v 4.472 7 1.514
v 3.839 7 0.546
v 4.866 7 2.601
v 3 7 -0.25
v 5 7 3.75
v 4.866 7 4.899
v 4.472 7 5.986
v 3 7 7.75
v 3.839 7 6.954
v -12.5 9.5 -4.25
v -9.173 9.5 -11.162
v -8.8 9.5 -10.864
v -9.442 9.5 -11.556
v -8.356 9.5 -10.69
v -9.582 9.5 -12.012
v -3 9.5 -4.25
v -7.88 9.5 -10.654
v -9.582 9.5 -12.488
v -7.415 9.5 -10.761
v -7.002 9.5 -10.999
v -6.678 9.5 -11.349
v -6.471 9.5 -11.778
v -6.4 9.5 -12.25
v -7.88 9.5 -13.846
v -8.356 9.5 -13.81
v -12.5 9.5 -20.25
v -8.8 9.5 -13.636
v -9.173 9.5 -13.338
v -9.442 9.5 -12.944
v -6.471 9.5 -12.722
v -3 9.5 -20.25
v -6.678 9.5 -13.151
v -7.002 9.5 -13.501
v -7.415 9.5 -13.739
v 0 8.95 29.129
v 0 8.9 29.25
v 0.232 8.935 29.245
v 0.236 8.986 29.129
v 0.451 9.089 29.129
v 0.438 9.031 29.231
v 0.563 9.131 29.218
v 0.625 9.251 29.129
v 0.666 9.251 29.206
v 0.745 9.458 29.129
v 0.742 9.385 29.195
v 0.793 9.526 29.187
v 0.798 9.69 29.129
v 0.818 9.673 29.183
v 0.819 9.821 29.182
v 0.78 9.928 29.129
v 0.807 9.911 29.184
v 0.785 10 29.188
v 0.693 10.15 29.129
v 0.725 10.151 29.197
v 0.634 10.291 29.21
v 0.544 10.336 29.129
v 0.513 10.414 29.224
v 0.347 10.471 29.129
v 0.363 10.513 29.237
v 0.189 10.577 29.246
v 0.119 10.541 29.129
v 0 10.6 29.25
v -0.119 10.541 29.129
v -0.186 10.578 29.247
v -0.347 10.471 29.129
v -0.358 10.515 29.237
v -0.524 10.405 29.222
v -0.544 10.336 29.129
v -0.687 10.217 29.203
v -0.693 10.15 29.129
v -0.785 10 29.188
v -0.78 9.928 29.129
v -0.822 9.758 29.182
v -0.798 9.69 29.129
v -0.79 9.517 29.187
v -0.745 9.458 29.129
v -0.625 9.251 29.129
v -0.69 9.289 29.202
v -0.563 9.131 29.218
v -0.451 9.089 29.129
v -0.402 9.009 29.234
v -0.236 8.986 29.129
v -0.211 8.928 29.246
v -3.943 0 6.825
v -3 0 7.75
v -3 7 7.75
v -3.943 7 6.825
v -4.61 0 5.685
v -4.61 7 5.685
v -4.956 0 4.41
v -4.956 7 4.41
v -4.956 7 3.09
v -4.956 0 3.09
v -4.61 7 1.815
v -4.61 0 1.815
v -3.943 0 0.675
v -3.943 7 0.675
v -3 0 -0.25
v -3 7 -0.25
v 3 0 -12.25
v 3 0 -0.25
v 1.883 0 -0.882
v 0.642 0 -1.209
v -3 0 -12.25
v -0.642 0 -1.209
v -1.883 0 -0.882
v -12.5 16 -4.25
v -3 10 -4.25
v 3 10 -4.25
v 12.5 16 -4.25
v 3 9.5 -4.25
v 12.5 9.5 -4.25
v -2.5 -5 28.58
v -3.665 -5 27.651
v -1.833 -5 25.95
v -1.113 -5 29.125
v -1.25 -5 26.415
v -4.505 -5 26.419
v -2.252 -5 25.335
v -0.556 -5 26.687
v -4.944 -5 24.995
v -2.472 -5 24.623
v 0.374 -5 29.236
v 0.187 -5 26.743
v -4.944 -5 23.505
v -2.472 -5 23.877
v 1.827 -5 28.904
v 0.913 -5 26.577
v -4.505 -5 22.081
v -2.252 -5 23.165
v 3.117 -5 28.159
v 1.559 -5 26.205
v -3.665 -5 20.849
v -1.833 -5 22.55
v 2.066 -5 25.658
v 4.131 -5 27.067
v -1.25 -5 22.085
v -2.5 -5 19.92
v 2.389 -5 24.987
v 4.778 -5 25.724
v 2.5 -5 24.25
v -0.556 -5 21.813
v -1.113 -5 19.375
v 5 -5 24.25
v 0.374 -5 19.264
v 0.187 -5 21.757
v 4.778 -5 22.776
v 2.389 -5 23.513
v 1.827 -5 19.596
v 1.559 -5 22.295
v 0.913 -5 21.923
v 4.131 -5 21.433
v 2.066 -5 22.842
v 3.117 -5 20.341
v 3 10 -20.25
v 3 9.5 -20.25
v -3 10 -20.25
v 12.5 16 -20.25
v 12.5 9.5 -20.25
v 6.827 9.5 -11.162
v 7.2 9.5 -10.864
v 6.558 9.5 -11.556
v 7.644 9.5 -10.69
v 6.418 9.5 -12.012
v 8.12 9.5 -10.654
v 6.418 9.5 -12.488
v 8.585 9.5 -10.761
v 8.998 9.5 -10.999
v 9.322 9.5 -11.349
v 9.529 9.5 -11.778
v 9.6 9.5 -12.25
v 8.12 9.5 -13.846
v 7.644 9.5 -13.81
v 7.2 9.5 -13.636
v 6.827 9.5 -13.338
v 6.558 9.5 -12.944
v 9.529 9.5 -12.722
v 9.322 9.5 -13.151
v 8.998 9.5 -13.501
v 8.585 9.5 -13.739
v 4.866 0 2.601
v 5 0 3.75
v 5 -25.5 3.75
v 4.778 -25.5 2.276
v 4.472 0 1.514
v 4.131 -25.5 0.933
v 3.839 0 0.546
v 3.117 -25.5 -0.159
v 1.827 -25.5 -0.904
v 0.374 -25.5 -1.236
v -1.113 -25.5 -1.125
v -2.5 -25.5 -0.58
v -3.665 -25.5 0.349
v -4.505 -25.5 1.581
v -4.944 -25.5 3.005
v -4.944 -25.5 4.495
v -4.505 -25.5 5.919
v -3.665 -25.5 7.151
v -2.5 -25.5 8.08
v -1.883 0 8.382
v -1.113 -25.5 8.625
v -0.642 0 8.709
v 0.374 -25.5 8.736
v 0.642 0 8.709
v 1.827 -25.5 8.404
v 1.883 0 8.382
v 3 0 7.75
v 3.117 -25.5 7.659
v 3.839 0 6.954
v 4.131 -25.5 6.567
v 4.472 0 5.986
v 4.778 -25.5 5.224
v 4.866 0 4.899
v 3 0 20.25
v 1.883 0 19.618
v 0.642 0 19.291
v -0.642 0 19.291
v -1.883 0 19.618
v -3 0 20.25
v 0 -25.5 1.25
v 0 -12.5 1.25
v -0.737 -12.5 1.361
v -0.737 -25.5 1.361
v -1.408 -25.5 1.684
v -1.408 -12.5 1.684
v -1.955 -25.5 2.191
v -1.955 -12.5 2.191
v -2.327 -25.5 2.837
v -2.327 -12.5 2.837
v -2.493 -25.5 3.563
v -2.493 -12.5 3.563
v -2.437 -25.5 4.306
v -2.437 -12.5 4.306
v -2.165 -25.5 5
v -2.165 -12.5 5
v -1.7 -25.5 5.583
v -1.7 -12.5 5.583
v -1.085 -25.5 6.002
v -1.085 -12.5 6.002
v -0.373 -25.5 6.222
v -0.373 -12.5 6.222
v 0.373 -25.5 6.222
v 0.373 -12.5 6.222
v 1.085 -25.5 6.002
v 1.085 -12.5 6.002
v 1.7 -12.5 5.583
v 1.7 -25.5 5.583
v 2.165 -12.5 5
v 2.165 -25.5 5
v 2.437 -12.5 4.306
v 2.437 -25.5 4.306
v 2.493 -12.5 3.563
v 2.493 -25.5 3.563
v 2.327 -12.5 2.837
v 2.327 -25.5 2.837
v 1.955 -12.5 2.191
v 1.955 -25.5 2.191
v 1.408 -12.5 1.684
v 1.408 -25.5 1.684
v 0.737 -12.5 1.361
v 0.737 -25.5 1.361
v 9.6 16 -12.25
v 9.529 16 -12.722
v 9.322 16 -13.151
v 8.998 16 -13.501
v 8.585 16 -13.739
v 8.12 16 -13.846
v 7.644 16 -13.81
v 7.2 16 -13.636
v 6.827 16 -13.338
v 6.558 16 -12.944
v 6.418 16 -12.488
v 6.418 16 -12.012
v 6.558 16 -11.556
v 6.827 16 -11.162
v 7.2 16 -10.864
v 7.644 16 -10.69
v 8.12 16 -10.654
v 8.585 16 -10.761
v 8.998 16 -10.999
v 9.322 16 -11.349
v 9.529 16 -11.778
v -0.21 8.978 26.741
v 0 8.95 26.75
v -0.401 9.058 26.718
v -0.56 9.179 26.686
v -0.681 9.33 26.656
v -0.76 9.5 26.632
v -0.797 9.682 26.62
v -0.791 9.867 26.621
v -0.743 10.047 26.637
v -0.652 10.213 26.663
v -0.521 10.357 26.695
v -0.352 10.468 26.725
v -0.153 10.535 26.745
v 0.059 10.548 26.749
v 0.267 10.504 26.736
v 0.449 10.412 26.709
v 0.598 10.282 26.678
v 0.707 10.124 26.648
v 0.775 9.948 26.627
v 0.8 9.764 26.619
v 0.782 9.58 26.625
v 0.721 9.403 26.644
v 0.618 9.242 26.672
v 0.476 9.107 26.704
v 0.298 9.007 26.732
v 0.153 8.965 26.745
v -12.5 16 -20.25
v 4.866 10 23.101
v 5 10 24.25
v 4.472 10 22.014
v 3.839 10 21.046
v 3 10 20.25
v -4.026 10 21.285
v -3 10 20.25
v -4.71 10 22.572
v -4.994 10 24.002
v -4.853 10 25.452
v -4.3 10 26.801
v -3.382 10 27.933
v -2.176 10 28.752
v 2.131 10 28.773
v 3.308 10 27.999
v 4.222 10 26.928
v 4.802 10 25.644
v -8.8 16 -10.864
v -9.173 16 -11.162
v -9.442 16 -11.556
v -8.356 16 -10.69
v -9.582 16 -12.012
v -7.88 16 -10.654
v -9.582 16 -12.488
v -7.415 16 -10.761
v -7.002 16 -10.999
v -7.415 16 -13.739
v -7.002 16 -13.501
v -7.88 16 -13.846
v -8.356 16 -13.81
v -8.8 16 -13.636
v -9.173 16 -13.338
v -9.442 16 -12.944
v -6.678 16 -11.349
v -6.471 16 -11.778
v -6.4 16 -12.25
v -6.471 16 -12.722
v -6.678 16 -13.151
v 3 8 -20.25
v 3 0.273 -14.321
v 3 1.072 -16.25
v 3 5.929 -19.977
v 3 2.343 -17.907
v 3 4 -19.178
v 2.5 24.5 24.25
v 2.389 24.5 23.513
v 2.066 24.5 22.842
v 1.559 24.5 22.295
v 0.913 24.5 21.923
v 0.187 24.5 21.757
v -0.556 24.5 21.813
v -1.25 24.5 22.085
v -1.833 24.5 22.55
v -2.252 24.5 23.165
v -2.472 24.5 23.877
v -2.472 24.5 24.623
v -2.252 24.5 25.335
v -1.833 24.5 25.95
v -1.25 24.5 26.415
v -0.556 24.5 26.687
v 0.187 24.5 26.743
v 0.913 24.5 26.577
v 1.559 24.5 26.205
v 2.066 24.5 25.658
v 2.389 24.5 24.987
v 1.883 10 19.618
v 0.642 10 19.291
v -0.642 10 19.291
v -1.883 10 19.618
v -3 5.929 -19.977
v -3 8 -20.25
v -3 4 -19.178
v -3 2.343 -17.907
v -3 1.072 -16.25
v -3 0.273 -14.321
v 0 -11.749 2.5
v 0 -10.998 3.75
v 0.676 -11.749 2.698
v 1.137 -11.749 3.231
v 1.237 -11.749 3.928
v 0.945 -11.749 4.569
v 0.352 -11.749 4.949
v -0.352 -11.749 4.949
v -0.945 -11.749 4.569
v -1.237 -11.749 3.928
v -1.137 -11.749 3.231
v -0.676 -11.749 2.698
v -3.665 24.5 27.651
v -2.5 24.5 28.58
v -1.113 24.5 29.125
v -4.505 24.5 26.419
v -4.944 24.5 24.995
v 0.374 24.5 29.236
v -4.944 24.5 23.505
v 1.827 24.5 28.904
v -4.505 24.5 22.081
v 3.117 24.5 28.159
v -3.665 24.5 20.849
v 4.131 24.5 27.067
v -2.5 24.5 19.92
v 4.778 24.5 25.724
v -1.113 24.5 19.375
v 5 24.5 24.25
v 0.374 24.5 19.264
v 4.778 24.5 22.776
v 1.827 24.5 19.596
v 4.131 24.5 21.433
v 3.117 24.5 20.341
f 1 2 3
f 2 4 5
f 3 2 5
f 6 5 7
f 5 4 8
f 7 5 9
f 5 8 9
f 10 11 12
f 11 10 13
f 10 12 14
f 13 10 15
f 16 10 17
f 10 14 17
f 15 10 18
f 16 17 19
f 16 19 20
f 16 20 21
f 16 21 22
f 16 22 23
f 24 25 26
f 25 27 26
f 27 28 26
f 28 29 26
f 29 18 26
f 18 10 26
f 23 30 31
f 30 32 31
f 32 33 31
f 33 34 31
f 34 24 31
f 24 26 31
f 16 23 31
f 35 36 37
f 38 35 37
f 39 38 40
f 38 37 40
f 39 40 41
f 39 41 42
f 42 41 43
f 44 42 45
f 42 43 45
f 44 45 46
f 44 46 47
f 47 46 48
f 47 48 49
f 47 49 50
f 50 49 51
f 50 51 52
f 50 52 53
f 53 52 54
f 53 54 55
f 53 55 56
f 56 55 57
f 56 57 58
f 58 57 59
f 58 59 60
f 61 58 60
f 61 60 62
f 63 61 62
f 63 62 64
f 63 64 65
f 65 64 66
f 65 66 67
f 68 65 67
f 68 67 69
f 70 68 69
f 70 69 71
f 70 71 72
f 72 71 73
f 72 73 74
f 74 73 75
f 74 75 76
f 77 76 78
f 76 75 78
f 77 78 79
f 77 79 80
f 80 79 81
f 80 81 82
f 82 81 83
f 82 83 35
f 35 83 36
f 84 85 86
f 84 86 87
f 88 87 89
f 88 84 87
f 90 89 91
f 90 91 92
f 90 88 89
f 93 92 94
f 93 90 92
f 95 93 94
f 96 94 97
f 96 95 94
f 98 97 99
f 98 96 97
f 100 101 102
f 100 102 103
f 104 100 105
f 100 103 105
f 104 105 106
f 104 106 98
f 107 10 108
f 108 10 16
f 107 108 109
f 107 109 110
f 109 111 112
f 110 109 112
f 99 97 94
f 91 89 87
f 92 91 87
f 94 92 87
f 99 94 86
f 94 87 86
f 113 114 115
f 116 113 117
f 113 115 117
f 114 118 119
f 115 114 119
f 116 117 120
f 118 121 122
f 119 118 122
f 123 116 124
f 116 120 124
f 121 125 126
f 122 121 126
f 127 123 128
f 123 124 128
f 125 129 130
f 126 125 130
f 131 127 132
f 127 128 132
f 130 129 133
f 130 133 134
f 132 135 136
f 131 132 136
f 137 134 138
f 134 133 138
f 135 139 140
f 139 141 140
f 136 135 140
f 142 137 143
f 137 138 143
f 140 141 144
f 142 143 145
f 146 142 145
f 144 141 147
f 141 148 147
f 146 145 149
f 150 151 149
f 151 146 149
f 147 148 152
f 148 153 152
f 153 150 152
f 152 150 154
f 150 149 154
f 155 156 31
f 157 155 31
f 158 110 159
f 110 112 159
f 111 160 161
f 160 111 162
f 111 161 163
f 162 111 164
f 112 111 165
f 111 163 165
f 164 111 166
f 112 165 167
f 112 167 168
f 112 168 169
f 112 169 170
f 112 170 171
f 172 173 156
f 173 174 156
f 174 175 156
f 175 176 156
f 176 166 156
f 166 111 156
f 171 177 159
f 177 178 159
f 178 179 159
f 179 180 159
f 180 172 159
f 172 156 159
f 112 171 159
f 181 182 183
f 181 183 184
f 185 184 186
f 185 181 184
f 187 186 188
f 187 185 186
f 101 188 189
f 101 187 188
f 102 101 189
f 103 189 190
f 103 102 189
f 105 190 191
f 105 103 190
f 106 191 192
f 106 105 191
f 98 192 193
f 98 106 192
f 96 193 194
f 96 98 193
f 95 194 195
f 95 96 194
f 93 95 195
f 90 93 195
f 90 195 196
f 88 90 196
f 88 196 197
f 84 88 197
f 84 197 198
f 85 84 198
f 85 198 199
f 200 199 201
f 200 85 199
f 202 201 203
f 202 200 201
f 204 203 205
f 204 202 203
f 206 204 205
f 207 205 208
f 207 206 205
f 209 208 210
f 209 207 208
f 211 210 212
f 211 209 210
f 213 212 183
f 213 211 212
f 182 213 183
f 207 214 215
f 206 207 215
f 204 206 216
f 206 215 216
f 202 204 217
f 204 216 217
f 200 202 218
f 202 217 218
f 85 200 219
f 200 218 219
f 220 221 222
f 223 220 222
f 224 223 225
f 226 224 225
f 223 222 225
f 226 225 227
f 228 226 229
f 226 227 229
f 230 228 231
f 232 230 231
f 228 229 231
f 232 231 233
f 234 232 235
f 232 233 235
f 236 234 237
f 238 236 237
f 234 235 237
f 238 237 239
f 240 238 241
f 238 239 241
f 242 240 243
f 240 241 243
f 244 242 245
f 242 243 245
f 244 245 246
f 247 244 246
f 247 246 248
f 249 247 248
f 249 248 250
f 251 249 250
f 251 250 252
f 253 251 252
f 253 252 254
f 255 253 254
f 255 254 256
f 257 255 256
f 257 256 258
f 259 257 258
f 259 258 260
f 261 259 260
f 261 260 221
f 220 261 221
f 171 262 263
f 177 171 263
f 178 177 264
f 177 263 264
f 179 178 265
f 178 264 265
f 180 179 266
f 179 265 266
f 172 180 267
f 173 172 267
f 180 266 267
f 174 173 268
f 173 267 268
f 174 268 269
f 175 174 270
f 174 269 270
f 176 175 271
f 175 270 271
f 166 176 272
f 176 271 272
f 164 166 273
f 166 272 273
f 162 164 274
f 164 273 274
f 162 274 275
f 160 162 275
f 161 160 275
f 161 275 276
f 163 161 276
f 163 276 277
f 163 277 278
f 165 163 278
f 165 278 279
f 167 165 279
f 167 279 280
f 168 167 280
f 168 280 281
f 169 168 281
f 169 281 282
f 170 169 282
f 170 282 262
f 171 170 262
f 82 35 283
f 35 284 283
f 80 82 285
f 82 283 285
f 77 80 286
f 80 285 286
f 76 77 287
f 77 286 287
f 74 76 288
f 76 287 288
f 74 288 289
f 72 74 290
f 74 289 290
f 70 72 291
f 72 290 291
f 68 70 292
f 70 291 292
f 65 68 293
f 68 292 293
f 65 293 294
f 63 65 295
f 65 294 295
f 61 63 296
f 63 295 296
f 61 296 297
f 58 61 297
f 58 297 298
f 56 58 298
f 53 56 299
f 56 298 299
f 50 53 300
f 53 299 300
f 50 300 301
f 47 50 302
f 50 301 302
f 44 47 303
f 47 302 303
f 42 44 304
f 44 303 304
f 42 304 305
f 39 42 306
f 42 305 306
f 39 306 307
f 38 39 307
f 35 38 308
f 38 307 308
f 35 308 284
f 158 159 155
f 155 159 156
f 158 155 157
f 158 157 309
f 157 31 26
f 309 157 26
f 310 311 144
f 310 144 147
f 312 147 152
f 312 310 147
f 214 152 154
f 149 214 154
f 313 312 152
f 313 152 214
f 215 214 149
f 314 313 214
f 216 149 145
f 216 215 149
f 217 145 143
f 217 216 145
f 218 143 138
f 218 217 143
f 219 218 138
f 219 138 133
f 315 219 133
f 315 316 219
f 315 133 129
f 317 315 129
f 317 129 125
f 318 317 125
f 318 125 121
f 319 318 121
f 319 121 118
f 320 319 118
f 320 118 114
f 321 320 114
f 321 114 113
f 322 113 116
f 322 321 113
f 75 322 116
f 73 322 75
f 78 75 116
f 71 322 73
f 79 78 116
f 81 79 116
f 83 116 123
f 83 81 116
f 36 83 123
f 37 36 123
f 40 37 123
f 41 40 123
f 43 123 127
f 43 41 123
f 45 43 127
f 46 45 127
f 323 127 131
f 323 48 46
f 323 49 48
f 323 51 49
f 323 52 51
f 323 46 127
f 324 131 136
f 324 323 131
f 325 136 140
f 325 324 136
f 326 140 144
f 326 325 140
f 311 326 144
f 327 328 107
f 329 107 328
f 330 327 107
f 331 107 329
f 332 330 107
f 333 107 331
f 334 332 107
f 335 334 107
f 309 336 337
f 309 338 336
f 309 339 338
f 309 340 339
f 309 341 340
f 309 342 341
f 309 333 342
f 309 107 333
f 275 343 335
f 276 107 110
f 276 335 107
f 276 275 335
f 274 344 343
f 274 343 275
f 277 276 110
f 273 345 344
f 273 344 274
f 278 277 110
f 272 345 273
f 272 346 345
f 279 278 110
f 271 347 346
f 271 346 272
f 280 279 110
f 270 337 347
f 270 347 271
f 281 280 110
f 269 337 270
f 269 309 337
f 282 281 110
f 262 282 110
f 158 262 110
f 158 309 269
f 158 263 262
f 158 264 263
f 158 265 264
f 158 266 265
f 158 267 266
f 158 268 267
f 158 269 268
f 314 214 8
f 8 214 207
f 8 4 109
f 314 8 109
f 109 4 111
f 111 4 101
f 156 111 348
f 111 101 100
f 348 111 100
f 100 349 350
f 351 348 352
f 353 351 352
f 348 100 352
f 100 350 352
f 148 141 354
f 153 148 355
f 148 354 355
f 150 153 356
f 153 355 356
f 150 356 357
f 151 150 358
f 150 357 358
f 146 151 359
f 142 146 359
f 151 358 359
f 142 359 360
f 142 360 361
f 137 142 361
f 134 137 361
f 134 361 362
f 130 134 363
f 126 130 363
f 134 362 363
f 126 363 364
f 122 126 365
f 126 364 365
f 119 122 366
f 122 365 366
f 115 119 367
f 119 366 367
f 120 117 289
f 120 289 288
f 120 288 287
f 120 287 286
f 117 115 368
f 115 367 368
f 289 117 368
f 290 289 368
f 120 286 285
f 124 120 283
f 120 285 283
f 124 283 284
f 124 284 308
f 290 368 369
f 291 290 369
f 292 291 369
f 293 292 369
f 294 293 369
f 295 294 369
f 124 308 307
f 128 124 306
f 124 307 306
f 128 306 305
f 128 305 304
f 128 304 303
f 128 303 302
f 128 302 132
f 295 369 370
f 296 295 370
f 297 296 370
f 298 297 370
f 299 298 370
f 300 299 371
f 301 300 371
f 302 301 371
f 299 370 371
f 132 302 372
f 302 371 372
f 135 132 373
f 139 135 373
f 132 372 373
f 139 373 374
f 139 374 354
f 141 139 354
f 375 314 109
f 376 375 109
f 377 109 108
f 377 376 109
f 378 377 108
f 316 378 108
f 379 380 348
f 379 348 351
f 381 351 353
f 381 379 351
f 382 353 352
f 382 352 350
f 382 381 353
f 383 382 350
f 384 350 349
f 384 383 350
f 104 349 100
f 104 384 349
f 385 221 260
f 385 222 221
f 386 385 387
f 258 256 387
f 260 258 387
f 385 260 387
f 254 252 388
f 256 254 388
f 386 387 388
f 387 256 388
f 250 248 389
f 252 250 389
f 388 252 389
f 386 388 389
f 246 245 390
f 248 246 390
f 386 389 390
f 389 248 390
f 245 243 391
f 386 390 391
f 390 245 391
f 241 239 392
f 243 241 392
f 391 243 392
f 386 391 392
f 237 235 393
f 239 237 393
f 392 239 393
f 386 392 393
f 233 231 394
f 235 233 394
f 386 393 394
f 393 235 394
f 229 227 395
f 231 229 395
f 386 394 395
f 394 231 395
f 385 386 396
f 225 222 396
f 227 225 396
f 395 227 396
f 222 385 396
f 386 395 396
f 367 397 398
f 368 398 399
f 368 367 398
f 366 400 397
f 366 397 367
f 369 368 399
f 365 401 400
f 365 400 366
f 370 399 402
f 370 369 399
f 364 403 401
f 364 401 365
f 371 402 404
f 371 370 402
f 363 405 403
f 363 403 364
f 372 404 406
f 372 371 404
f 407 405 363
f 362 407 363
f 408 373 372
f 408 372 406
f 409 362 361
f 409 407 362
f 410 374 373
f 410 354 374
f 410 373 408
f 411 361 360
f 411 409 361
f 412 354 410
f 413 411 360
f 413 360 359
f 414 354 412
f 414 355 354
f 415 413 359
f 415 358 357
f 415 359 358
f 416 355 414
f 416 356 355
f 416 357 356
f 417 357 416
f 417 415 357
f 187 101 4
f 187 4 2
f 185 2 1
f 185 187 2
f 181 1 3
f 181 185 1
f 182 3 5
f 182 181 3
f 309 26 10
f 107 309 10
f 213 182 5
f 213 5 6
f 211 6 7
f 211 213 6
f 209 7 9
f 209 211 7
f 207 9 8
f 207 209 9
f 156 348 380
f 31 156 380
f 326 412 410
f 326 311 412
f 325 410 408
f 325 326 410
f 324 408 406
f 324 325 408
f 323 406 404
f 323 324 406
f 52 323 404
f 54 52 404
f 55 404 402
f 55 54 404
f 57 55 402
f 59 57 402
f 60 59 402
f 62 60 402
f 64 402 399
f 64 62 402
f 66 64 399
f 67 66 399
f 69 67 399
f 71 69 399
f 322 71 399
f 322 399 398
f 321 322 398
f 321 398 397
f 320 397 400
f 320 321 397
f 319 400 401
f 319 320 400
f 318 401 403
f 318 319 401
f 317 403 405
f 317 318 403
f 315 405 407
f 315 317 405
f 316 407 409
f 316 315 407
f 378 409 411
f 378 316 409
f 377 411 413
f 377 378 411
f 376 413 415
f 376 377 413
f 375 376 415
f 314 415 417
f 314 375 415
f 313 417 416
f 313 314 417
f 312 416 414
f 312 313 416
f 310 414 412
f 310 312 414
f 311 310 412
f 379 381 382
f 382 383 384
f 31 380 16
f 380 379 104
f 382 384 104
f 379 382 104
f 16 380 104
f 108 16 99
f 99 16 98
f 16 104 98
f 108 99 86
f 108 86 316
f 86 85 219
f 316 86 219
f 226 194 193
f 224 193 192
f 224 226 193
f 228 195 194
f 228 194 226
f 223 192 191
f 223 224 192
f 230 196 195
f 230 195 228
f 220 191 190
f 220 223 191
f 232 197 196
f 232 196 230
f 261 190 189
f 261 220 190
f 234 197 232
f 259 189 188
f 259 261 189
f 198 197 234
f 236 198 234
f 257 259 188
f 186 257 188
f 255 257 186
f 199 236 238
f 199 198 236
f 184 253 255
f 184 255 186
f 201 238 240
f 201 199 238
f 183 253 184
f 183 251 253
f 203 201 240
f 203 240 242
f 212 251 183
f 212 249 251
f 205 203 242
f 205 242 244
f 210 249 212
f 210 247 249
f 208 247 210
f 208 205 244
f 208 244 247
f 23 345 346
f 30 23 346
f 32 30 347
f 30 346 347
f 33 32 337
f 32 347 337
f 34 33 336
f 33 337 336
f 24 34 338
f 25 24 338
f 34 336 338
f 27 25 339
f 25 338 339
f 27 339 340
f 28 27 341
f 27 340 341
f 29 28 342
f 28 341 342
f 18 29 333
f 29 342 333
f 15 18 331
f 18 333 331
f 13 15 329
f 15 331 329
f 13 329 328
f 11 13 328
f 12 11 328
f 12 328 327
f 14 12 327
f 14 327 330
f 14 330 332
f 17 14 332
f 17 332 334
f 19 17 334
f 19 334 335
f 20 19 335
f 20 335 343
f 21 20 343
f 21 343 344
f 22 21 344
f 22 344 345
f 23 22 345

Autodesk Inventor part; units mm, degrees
ref_plane "YZ Plane" through (0, 0, 0) normal (1, 0, 0) x (0, 1, 0)
ref_plane "XZ Plane" through (0, 0, 0) normal (0, 1, 0) x (-1, 0, 0)
sketch "Sketch1" plane through (0, 0, 0) normal (0, 1, 0) x (-1, 0, 0)
  line L0 (3, 20.25) -> (-3, 20.25)
  line L1 (-3, 20.25) -> (-3, -20.25)
  line L2 (-3, -20.25) -> (3, -20.25)
  line L3 (3, -20.25) -> (3, 20.25)
  line L4 (3, 20.25) -> (-3, -20.25) construction
  line L5 (-3, 20.25) -> (3, -20.25) construction
  point P0 (0, 0)
  dimension "d0" = 6
  dimension "d1" = 40.5
extrude "Extrusion1" add sketch "Sketch1" along normal blind 10
fillet "Fillet1" radius 8 1 edges at (0, 0, -20.25)
sketch "Sketch2" plane through (0, 10, 0) normal (0, 1, 0) x (1, 0, 0)
  line L0 (3, 20.25) -> (-3, 20.25) construction
  line L1 (0, 20.25) -> (0, -24.25) construction
  circle A0 centre (0, -24.25) radius 5
  point P0 (0, 0)
  dimension "d5" = 44.5
  dimension "d6" = 10
extrude "Extrusion2" add sketch "Sketch2" along normal blind 14.5 and the other way blind 15
sketch "Sketch3" plane through (0, 0, 0) normal (0, -1, 0) x (1, 0, 0)
  line L0 (3, -20.25) -> (-3, -20.25) construction
  line L1 (0, -20.25) -> (0, 3.75) construction
  circle A0 centre (0, 3.75) radius 5
  point P0 (0, 0)
  dimension "d11" = 24
  dimension "d12" = 10
extrude "Extrusion3" add sketch "Sketch3" along normal blind 25.5 and the other way blind 7
sketch "Sketch4" plane through (0, 10, 0) normal (0, 1, 0) x (1, 0, 0)
  line L0 (-3, 20.25) -> (3, 20.25) construction
  line L1 (0, 20.25) -> (0, 12.25) construction
  line L2 (-12.5, 4.25) -> (12.5, 4.25)
  line L3 (12.5, 4.25) -> (12.5, 20.25)
  line L4 (12.5, 20.25) -> (-12.5, 20.25)
  line L5 (-12.5, 20.25) -> (-12.5, 4.25)
  line L6 (-12.5, 4.25) -> (12.5, 20.25) construction
  line L7 (12.5, 4.25) -> (-12.5, 20.25) construction
  point P0 (0, 0)
  dimension "d17" = 8
  dimension "d18" = 25
extrude "Extrusion4" add sketch "Sketch4" along normal blind 6 and the other way blind 0.5
sketch "Sketch5" plane through (0, 16, 0) normal (0, 1, 0) x (1, 0, 0)
  line L0 (-3, 20.25) -> (3, 20.25) construction
  line L1 (0, 20.25) -> (0, 12.25) construction
  line L2 (0, 12.25) -> (-8, 12.25) construction
  circle A0 centre (-8, 12.25) radius 1.6
  circle A1 centre (8, 12.25) radius 1.6
  point P0 (0, 0)
  dimension "d23" = 8
  dimension "d24" = 8
  dimension "d25" = 3.2
extrude "Extrusion5" cut sketch "Sketch5" against normal through all
sketch "Sketch6" plane through (0, 24.5, 24.25) normal (0, 1, 0) x (1, 0, 0)
  circle A0 centre (0, 0) radius 2.5
  point P0 (0, 24.25)
  dimension "d28" = 5
extrude "Extrusion6" cut sketch "Sketch6" against normal through all
sketch "Sketch7" plane through (0, -25.5, 3.75) normal (0, -1, 0) x (1, 0, 0)
  circle A0 centre (0, 0) radius 1.3196
  point P0 (0, -3.75)
hole "Hole1" at (0, -25.5, 3.75) direction (0, 1, 0) diameter 5 depth 13 tip angle 118
ref_plane "Work Plane1" through (0, 0, 29.25) normal (0, 0, 1) x (1, 0, 0)
sketch "Sketch8" plane through (0, 0, 29.25) normal (0, 0, 1) x (1, 0, 0)
  line L0 (5, 24.5) -> (-5, 24.5) projected
  line L1 (0, 24.5) -> (0, 9.75)
  circle A0 centre (0, 9.75) radius 0.8
  point P0 (0, 0)
  dimension "d39" = 14.75
  dimension "d40" = 1.6
hole "Hole2" at (0, 9.75, 29.25) direction (0, 0, -1) diameter 1.6 end up to surface countersink diameter 1.7 countersink angle 45
properties part number "Supporto DX"
